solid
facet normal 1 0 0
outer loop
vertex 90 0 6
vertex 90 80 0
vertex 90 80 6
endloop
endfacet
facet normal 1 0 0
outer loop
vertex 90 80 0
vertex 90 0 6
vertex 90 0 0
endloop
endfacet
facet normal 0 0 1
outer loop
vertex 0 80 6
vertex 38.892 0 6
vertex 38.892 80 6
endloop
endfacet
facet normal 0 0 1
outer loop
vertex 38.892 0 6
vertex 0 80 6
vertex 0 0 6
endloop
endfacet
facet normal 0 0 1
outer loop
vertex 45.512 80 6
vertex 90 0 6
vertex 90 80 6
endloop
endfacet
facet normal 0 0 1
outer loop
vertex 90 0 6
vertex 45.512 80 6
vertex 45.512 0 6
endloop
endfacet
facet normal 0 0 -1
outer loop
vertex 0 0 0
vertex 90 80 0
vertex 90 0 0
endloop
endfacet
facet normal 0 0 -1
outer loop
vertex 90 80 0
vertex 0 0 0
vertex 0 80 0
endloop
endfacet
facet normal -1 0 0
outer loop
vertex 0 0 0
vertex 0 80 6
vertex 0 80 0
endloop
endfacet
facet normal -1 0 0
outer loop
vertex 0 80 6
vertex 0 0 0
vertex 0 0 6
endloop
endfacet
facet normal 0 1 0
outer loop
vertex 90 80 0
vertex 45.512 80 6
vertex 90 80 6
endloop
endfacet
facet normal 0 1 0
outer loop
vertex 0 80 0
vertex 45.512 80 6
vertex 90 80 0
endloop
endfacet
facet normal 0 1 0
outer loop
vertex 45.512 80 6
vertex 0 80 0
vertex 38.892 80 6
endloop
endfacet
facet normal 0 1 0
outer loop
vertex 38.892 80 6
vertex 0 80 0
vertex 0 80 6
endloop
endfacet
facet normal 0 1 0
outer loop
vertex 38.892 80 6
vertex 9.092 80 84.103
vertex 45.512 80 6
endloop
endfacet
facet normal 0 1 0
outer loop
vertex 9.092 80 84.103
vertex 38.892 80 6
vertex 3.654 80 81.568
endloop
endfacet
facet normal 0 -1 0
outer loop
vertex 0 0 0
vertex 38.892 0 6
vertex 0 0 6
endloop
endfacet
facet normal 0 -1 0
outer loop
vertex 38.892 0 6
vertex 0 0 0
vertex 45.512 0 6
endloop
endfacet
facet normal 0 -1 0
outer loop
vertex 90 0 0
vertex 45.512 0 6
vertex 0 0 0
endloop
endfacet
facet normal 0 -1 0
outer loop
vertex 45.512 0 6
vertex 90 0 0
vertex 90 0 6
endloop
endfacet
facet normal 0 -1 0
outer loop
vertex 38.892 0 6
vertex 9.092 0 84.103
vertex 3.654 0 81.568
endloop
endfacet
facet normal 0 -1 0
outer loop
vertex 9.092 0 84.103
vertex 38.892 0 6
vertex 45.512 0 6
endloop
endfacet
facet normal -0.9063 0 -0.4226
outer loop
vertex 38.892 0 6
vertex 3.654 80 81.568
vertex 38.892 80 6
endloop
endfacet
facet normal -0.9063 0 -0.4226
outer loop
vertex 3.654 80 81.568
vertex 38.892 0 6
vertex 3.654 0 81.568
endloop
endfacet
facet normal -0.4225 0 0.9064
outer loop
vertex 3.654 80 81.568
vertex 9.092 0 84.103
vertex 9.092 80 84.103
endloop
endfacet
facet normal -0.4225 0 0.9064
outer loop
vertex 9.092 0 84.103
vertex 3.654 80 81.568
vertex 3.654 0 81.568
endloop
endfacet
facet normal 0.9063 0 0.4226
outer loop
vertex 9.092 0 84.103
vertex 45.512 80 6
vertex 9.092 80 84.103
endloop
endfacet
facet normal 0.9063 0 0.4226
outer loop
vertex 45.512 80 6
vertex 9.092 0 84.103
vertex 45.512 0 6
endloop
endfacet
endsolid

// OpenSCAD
// [Mechanical Parameters]
lean_deg = 65;   // [45:1:80] Backrest angle from the base plane, leaning back away from the user
base_len = 90;   // [60:1:150] Base plate length along x (front to back depth)
base_wid = 80;   // [50:1:120] Base plate width along y; also the backrest width
base_t = 6;      // [3:0.5:12] Base plate thickness along z
back_t = 6;      // [3:0.5:12] Backrest plate thickness, normal to its face
back_len = 90;   // [60:1:120] Backrest plate length measured along its face from the lower end
slot_w = back_t/sin(lean_deg);
plate_x = base_len/2 - slot_w/2 - back_len*cos(lean_deg);
$fn = 48;

module base_plate() {   // min corner at origin, resting on z = 0
    cube([base_len, base_wid, base_t]);
}

module backrest() {   // xz profile extruded along y; local min corner at origin
    translate([0, base_wid, 0])
        rotate([90, 0, 0])
            linear_extrude(height = base_wid)
                polygon(points = [
                    [back_len*cos(lean_deg), 0],
                    [back_len*cos(lean_deg) + back_t*sin(lean_deg), back_t*cos(lean_deg)],
                    [back_t*sin(lean_deg), back_len*sin(lean_deg) + back_t*cos(lean_deg)],
                    [0, back_len*sin(lean_deg)]
                ]);
}

// ---- Assembly placement (generated from the approved Assembly Spec) ----
// Placement is computed from the spec, not written by the model.
// Edit the *_pos_* parameters to preview a move; change the spec to keep it.
/* [Assembly Placement] */
backrest_pos_x = plate_x;   // x = plate_x = base_len/2 - slot_w/2 - back_len*cos(lean_deg), which centres the lower edge on the base midline; y = 0; z = 0 because the lowest corner of the profile is at z = 0.
union() {
    // base_plate: Origin is the base min corner, so position is [0,0,0].
    base_plate();
    translate([backrest_pos_x, 0, 0]) backrest();
}
